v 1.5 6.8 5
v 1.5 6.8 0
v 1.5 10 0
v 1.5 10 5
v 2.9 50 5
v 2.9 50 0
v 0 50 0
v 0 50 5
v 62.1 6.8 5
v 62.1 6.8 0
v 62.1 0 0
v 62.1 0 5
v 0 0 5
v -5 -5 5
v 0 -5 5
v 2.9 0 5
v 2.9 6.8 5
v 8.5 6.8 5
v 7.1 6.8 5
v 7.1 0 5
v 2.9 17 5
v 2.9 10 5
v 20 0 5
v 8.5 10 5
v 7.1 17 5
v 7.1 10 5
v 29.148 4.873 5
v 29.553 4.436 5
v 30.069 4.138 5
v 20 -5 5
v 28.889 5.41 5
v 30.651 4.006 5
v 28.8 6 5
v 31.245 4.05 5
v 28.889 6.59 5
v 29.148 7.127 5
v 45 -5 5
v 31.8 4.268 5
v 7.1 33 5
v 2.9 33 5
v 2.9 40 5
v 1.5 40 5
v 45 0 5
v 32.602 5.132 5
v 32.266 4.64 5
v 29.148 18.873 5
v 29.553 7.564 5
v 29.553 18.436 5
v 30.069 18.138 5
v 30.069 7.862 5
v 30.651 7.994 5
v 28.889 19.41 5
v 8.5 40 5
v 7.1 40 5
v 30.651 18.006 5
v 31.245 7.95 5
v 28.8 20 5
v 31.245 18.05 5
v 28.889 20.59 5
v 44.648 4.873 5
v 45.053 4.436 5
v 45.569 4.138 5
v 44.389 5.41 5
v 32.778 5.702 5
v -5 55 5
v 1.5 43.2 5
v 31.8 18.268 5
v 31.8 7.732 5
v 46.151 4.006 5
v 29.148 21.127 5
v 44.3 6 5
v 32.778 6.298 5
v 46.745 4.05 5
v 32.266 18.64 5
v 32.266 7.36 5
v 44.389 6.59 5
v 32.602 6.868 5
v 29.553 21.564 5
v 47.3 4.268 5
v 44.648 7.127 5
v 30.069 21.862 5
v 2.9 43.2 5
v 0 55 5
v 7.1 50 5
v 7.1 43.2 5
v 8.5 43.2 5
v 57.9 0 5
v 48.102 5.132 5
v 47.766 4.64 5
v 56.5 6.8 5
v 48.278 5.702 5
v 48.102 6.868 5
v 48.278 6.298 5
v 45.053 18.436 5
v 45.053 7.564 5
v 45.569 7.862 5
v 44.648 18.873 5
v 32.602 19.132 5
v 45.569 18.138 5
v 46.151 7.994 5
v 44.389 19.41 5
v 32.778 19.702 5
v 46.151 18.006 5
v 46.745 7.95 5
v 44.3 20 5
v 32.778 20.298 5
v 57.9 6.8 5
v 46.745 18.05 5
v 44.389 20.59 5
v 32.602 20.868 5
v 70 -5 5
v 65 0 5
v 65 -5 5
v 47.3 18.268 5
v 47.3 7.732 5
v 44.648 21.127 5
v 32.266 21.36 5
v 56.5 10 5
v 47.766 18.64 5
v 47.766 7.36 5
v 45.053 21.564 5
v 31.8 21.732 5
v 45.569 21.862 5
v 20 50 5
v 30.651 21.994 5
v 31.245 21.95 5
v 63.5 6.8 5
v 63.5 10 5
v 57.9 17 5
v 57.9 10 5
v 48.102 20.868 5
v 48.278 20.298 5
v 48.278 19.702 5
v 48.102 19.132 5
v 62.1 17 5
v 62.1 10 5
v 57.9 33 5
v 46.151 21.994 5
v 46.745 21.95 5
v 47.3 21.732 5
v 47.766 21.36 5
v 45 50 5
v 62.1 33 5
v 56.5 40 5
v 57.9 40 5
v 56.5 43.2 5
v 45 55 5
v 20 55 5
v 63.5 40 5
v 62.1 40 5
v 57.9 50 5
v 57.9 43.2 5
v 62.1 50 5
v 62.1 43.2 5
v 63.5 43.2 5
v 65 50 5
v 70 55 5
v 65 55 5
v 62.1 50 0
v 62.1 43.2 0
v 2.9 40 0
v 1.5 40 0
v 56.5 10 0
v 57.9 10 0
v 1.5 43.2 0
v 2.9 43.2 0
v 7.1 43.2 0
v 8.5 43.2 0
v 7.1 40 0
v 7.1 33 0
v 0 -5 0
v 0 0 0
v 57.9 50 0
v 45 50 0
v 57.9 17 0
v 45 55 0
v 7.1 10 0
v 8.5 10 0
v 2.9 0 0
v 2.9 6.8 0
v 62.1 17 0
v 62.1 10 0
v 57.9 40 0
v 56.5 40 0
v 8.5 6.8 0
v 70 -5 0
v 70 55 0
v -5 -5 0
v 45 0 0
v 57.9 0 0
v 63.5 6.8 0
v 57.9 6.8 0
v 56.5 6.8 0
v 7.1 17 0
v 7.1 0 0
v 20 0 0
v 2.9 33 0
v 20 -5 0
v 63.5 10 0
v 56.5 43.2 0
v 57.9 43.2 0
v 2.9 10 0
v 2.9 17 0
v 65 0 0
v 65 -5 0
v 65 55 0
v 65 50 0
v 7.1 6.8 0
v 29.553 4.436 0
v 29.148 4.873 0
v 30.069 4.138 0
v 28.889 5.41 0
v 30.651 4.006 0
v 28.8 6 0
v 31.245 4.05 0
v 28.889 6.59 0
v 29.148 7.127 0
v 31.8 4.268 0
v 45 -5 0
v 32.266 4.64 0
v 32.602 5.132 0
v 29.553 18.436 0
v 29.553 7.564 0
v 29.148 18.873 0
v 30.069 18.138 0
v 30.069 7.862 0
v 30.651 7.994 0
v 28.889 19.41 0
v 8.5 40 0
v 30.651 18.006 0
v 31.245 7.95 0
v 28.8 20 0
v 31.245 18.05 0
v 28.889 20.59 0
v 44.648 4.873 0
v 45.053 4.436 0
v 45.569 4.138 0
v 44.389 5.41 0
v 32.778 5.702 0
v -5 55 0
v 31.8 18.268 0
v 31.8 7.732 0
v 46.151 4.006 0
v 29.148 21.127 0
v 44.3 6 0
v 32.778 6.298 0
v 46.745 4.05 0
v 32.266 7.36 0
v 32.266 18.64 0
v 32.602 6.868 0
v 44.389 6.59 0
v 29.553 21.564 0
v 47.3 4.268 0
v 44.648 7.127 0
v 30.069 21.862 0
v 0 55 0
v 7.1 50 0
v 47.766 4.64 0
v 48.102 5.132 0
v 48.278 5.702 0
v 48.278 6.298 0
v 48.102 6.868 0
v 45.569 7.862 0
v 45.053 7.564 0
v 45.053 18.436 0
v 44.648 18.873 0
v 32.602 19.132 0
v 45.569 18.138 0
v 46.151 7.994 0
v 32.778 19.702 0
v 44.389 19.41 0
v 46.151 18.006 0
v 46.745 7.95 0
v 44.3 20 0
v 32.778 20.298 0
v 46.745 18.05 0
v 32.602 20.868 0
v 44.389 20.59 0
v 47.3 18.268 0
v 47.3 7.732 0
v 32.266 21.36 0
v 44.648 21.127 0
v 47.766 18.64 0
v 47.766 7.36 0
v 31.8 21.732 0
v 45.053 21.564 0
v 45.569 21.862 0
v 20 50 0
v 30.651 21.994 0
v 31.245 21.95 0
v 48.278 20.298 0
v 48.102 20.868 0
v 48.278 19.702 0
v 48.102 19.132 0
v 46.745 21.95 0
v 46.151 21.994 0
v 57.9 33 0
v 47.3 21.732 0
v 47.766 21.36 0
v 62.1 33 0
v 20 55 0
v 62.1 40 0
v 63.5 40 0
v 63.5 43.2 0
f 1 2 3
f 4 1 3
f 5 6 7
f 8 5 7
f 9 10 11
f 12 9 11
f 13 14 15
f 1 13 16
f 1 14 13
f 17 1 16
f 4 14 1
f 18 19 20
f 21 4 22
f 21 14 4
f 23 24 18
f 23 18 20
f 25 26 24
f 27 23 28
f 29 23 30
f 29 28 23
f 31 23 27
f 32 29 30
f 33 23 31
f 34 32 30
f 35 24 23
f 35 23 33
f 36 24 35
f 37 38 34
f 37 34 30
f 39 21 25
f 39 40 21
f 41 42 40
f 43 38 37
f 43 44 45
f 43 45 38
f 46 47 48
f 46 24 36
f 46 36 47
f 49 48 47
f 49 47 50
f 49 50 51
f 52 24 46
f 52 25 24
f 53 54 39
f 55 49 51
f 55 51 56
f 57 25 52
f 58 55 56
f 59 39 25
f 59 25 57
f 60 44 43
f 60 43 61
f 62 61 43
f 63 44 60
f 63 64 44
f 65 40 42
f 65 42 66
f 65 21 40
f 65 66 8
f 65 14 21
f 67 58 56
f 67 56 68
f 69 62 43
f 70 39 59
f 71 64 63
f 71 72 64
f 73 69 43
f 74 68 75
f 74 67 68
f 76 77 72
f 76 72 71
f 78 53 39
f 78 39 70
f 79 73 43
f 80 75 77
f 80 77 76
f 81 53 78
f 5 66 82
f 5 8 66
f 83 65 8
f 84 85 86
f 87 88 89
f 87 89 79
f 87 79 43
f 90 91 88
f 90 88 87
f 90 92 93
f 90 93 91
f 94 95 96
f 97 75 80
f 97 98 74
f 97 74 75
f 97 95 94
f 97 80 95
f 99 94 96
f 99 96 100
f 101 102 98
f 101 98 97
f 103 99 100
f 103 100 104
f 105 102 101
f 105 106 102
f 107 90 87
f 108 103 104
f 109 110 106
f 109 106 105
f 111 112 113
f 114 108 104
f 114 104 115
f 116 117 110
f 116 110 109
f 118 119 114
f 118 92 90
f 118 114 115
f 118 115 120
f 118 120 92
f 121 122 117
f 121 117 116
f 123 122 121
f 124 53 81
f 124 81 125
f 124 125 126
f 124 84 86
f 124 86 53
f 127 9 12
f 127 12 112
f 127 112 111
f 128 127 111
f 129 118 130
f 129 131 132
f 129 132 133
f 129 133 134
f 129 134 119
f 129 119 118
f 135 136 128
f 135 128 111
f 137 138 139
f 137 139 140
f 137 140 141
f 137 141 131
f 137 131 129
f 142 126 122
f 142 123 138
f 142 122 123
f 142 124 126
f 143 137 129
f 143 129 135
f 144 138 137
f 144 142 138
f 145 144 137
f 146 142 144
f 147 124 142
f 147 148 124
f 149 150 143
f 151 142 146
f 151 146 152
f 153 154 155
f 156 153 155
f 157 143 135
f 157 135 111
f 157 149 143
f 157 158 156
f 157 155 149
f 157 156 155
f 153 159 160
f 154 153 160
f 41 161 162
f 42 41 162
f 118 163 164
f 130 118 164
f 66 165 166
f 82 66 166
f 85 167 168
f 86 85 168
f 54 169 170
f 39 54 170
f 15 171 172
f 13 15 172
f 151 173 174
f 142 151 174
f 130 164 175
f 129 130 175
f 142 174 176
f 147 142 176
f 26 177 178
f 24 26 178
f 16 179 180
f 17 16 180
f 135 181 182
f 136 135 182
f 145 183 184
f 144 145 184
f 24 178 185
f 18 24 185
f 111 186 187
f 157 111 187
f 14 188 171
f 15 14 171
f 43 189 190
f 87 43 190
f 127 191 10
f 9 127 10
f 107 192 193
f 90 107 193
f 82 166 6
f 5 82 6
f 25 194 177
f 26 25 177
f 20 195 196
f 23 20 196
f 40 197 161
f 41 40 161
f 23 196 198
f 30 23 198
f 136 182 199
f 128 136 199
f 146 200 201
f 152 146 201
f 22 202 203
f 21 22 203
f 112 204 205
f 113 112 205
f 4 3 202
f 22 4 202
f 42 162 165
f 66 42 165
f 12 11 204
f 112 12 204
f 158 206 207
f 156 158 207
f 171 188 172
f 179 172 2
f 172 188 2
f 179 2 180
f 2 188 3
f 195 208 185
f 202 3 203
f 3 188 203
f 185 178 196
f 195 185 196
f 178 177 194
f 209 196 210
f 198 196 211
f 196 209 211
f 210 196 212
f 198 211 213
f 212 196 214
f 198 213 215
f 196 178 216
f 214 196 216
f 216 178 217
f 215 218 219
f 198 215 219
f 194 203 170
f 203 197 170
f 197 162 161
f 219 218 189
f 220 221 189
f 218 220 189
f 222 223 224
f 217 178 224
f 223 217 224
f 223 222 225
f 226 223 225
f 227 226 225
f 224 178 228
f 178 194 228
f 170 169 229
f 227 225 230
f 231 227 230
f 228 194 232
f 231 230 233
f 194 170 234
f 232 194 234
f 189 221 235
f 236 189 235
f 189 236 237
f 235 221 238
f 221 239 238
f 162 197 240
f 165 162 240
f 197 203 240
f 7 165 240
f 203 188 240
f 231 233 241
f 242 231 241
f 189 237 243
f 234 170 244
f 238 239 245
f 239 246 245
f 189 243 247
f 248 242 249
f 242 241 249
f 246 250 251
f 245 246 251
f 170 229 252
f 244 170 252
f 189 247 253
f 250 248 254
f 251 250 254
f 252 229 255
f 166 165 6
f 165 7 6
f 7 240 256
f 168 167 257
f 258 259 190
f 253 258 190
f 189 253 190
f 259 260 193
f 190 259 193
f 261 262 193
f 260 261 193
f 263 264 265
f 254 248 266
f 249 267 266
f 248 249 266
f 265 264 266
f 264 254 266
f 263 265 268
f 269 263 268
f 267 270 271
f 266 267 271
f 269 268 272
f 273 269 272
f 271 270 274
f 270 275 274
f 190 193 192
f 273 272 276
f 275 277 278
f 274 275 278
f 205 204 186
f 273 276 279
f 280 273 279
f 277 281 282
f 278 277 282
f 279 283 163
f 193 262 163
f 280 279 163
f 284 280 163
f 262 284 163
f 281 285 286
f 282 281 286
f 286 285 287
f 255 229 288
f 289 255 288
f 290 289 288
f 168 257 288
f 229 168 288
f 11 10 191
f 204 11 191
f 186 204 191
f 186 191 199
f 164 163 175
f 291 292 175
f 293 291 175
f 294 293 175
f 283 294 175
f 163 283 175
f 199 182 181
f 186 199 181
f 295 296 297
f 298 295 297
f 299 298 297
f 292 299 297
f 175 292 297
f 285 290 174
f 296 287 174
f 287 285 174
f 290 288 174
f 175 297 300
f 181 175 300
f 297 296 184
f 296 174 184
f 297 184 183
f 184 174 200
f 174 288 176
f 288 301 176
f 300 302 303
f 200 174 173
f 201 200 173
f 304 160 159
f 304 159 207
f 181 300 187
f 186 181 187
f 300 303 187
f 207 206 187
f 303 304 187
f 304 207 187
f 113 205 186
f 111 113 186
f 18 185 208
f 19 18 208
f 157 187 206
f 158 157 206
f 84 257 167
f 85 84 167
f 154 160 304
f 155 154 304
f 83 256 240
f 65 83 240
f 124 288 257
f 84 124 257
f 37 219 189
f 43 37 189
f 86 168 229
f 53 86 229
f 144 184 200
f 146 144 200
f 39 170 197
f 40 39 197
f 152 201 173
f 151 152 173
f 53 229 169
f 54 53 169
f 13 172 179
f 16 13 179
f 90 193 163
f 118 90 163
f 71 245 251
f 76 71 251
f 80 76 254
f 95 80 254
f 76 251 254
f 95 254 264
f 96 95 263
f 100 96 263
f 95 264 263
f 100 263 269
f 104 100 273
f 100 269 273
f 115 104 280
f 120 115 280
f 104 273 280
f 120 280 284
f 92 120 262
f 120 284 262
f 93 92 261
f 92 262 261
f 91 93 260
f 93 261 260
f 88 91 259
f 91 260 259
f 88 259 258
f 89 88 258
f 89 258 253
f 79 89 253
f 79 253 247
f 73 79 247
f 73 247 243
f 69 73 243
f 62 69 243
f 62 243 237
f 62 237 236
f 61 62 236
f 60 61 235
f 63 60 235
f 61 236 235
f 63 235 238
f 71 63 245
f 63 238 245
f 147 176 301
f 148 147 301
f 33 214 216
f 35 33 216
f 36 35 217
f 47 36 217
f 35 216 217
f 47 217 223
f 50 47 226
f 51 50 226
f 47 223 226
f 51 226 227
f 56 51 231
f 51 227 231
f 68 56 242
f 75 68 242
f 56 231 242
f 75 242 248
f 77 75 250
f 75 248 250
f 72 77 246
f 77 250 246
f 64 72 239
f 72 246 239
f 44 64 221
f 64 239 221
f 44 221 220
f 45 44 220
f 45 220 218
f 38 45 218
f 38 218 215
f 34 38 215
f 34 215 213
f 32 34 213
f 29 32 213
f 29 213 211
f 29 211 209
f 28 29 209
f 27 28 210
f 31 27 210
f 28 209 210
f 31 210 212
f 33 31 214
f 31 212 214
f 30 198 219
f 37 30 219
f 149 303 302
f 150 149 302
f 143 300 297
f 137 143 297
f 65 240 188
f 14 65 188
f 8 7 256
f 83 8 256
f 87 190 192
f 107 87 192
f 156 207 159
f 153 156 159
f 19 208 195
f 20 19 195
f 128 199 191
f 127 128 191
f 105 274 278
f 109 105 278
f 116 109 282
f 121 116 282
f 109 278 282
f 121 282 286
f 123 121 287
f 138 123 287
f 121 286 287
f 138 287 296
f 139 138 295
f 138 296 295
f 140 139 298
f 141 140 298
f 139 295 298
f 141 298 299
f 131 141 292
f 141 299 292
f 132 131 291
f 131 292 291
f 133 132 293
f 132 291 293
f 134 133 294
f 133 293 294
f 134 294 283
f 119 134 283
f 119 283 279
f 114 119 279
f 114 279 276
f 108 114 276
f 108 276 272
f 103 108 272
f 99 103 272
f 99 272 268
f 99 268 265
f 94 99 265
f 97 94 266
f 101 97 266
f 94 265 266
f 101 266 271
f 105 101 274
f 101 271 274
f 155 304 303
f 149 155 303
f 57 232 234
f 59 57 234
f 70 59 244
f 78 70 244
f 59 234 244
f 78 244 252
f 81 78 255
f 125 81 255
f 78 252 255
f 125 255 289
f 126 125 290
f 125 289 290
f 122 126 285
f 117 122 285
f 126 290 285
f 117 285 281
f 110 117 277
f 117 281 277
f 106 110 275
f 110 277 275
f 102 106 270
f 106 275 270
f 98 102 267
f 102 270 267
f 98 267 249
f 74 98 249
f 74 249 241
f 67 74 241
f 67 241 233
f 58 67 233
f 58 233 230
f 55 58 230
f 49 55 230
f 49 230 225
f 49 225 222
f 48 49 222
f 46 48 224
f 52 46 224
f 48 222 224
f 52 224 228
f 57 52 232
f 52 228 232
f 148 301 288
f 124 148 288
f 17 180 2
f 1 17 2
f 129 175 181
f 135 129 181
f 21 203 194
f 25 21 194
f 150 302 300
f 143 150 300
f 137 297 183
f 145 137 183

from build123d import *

# Parameters (mm, degrees)
BOSS_EXTRUDE1_DEPTH = 5
SKETCH2_R           = 2
CUT_EXTRUDE2_DEPTH  = 5


with BuildPart() as part:
    # Sketch1 → Boss-Extrude1 (new body)
    with BuildSketch(Plane.XY):
        Polygon((2.9, 50), (0, 50), (0, 55), (-5, 55), (-5, -5), (0, -5), (0, 0), (2.9, 0), (2.9, 6.8), (1.5, 6.8), (1.5, 10), (2.9, 10), (2.9, 17), (7.1, 17), (7.1, 10), (8.5, 10), (8.5, 6.8), (7.1, 6.8), (7.1, 0), (20, 0), (20, -5), (45, -5), (45, 0), (57.9, 0), (57.9, 6.8), (56.5, 6.8), (56.5, 10), (57.9, 10), (57.9, 17), (62.1, 17), (62.1, 10), (63.5, 10), (63.5, 6.8), (62.1, 6.8), (62.1, 0), (65, 0), (65, -5), (70, -5), (70, 55), (65, 55), (65, 50), (62.1, 50), (62.1, 43.2), (63.5, 43.2), (63.5, 40), (62.1, 40), (62.1, 33), (57.9, 33), (57.9, 40), (56.5, 40), (56.5, 43.2), (57.9, 43.2), (57.9, 50), (45, 50), (45, 55), (20, 55), (20, 50), (7.1, 50), (7.1, 43.2), (8.5, 43.2), (8.5, 40), (7.1, 40), (7.1, 33), (2.9, 33), (2.9, 40), (1.5, 40), (1.5, 43.2), (2.9, 43.2), align=None)
    extrude(amount=BOSS_EXTRUDE1_DEPTH)

    # Sketch2 → Cut-Extrude2 (cut)
    with BuildSketch(Plane(origin=(0, 0, 0), x_dir=(-1, 0, 0), z_dir=(0, 0, -1))):
        with Locations((-46.3, 20)):
            Circle(SKETCH2_R)
        with Locations((-46.3, 6)):
            Circle(SKETCH2_R)
        with Locations((-30.8, 6)):
            Circle(SKETCH2_R)
        with Locations((-30.8, 20)):
            Circle(SKETCH2_R)
    extrude(amount=-CUT_EXTRUDE2_DEPTH, mode=Mode.SUBTRACT)


solid = part.part
